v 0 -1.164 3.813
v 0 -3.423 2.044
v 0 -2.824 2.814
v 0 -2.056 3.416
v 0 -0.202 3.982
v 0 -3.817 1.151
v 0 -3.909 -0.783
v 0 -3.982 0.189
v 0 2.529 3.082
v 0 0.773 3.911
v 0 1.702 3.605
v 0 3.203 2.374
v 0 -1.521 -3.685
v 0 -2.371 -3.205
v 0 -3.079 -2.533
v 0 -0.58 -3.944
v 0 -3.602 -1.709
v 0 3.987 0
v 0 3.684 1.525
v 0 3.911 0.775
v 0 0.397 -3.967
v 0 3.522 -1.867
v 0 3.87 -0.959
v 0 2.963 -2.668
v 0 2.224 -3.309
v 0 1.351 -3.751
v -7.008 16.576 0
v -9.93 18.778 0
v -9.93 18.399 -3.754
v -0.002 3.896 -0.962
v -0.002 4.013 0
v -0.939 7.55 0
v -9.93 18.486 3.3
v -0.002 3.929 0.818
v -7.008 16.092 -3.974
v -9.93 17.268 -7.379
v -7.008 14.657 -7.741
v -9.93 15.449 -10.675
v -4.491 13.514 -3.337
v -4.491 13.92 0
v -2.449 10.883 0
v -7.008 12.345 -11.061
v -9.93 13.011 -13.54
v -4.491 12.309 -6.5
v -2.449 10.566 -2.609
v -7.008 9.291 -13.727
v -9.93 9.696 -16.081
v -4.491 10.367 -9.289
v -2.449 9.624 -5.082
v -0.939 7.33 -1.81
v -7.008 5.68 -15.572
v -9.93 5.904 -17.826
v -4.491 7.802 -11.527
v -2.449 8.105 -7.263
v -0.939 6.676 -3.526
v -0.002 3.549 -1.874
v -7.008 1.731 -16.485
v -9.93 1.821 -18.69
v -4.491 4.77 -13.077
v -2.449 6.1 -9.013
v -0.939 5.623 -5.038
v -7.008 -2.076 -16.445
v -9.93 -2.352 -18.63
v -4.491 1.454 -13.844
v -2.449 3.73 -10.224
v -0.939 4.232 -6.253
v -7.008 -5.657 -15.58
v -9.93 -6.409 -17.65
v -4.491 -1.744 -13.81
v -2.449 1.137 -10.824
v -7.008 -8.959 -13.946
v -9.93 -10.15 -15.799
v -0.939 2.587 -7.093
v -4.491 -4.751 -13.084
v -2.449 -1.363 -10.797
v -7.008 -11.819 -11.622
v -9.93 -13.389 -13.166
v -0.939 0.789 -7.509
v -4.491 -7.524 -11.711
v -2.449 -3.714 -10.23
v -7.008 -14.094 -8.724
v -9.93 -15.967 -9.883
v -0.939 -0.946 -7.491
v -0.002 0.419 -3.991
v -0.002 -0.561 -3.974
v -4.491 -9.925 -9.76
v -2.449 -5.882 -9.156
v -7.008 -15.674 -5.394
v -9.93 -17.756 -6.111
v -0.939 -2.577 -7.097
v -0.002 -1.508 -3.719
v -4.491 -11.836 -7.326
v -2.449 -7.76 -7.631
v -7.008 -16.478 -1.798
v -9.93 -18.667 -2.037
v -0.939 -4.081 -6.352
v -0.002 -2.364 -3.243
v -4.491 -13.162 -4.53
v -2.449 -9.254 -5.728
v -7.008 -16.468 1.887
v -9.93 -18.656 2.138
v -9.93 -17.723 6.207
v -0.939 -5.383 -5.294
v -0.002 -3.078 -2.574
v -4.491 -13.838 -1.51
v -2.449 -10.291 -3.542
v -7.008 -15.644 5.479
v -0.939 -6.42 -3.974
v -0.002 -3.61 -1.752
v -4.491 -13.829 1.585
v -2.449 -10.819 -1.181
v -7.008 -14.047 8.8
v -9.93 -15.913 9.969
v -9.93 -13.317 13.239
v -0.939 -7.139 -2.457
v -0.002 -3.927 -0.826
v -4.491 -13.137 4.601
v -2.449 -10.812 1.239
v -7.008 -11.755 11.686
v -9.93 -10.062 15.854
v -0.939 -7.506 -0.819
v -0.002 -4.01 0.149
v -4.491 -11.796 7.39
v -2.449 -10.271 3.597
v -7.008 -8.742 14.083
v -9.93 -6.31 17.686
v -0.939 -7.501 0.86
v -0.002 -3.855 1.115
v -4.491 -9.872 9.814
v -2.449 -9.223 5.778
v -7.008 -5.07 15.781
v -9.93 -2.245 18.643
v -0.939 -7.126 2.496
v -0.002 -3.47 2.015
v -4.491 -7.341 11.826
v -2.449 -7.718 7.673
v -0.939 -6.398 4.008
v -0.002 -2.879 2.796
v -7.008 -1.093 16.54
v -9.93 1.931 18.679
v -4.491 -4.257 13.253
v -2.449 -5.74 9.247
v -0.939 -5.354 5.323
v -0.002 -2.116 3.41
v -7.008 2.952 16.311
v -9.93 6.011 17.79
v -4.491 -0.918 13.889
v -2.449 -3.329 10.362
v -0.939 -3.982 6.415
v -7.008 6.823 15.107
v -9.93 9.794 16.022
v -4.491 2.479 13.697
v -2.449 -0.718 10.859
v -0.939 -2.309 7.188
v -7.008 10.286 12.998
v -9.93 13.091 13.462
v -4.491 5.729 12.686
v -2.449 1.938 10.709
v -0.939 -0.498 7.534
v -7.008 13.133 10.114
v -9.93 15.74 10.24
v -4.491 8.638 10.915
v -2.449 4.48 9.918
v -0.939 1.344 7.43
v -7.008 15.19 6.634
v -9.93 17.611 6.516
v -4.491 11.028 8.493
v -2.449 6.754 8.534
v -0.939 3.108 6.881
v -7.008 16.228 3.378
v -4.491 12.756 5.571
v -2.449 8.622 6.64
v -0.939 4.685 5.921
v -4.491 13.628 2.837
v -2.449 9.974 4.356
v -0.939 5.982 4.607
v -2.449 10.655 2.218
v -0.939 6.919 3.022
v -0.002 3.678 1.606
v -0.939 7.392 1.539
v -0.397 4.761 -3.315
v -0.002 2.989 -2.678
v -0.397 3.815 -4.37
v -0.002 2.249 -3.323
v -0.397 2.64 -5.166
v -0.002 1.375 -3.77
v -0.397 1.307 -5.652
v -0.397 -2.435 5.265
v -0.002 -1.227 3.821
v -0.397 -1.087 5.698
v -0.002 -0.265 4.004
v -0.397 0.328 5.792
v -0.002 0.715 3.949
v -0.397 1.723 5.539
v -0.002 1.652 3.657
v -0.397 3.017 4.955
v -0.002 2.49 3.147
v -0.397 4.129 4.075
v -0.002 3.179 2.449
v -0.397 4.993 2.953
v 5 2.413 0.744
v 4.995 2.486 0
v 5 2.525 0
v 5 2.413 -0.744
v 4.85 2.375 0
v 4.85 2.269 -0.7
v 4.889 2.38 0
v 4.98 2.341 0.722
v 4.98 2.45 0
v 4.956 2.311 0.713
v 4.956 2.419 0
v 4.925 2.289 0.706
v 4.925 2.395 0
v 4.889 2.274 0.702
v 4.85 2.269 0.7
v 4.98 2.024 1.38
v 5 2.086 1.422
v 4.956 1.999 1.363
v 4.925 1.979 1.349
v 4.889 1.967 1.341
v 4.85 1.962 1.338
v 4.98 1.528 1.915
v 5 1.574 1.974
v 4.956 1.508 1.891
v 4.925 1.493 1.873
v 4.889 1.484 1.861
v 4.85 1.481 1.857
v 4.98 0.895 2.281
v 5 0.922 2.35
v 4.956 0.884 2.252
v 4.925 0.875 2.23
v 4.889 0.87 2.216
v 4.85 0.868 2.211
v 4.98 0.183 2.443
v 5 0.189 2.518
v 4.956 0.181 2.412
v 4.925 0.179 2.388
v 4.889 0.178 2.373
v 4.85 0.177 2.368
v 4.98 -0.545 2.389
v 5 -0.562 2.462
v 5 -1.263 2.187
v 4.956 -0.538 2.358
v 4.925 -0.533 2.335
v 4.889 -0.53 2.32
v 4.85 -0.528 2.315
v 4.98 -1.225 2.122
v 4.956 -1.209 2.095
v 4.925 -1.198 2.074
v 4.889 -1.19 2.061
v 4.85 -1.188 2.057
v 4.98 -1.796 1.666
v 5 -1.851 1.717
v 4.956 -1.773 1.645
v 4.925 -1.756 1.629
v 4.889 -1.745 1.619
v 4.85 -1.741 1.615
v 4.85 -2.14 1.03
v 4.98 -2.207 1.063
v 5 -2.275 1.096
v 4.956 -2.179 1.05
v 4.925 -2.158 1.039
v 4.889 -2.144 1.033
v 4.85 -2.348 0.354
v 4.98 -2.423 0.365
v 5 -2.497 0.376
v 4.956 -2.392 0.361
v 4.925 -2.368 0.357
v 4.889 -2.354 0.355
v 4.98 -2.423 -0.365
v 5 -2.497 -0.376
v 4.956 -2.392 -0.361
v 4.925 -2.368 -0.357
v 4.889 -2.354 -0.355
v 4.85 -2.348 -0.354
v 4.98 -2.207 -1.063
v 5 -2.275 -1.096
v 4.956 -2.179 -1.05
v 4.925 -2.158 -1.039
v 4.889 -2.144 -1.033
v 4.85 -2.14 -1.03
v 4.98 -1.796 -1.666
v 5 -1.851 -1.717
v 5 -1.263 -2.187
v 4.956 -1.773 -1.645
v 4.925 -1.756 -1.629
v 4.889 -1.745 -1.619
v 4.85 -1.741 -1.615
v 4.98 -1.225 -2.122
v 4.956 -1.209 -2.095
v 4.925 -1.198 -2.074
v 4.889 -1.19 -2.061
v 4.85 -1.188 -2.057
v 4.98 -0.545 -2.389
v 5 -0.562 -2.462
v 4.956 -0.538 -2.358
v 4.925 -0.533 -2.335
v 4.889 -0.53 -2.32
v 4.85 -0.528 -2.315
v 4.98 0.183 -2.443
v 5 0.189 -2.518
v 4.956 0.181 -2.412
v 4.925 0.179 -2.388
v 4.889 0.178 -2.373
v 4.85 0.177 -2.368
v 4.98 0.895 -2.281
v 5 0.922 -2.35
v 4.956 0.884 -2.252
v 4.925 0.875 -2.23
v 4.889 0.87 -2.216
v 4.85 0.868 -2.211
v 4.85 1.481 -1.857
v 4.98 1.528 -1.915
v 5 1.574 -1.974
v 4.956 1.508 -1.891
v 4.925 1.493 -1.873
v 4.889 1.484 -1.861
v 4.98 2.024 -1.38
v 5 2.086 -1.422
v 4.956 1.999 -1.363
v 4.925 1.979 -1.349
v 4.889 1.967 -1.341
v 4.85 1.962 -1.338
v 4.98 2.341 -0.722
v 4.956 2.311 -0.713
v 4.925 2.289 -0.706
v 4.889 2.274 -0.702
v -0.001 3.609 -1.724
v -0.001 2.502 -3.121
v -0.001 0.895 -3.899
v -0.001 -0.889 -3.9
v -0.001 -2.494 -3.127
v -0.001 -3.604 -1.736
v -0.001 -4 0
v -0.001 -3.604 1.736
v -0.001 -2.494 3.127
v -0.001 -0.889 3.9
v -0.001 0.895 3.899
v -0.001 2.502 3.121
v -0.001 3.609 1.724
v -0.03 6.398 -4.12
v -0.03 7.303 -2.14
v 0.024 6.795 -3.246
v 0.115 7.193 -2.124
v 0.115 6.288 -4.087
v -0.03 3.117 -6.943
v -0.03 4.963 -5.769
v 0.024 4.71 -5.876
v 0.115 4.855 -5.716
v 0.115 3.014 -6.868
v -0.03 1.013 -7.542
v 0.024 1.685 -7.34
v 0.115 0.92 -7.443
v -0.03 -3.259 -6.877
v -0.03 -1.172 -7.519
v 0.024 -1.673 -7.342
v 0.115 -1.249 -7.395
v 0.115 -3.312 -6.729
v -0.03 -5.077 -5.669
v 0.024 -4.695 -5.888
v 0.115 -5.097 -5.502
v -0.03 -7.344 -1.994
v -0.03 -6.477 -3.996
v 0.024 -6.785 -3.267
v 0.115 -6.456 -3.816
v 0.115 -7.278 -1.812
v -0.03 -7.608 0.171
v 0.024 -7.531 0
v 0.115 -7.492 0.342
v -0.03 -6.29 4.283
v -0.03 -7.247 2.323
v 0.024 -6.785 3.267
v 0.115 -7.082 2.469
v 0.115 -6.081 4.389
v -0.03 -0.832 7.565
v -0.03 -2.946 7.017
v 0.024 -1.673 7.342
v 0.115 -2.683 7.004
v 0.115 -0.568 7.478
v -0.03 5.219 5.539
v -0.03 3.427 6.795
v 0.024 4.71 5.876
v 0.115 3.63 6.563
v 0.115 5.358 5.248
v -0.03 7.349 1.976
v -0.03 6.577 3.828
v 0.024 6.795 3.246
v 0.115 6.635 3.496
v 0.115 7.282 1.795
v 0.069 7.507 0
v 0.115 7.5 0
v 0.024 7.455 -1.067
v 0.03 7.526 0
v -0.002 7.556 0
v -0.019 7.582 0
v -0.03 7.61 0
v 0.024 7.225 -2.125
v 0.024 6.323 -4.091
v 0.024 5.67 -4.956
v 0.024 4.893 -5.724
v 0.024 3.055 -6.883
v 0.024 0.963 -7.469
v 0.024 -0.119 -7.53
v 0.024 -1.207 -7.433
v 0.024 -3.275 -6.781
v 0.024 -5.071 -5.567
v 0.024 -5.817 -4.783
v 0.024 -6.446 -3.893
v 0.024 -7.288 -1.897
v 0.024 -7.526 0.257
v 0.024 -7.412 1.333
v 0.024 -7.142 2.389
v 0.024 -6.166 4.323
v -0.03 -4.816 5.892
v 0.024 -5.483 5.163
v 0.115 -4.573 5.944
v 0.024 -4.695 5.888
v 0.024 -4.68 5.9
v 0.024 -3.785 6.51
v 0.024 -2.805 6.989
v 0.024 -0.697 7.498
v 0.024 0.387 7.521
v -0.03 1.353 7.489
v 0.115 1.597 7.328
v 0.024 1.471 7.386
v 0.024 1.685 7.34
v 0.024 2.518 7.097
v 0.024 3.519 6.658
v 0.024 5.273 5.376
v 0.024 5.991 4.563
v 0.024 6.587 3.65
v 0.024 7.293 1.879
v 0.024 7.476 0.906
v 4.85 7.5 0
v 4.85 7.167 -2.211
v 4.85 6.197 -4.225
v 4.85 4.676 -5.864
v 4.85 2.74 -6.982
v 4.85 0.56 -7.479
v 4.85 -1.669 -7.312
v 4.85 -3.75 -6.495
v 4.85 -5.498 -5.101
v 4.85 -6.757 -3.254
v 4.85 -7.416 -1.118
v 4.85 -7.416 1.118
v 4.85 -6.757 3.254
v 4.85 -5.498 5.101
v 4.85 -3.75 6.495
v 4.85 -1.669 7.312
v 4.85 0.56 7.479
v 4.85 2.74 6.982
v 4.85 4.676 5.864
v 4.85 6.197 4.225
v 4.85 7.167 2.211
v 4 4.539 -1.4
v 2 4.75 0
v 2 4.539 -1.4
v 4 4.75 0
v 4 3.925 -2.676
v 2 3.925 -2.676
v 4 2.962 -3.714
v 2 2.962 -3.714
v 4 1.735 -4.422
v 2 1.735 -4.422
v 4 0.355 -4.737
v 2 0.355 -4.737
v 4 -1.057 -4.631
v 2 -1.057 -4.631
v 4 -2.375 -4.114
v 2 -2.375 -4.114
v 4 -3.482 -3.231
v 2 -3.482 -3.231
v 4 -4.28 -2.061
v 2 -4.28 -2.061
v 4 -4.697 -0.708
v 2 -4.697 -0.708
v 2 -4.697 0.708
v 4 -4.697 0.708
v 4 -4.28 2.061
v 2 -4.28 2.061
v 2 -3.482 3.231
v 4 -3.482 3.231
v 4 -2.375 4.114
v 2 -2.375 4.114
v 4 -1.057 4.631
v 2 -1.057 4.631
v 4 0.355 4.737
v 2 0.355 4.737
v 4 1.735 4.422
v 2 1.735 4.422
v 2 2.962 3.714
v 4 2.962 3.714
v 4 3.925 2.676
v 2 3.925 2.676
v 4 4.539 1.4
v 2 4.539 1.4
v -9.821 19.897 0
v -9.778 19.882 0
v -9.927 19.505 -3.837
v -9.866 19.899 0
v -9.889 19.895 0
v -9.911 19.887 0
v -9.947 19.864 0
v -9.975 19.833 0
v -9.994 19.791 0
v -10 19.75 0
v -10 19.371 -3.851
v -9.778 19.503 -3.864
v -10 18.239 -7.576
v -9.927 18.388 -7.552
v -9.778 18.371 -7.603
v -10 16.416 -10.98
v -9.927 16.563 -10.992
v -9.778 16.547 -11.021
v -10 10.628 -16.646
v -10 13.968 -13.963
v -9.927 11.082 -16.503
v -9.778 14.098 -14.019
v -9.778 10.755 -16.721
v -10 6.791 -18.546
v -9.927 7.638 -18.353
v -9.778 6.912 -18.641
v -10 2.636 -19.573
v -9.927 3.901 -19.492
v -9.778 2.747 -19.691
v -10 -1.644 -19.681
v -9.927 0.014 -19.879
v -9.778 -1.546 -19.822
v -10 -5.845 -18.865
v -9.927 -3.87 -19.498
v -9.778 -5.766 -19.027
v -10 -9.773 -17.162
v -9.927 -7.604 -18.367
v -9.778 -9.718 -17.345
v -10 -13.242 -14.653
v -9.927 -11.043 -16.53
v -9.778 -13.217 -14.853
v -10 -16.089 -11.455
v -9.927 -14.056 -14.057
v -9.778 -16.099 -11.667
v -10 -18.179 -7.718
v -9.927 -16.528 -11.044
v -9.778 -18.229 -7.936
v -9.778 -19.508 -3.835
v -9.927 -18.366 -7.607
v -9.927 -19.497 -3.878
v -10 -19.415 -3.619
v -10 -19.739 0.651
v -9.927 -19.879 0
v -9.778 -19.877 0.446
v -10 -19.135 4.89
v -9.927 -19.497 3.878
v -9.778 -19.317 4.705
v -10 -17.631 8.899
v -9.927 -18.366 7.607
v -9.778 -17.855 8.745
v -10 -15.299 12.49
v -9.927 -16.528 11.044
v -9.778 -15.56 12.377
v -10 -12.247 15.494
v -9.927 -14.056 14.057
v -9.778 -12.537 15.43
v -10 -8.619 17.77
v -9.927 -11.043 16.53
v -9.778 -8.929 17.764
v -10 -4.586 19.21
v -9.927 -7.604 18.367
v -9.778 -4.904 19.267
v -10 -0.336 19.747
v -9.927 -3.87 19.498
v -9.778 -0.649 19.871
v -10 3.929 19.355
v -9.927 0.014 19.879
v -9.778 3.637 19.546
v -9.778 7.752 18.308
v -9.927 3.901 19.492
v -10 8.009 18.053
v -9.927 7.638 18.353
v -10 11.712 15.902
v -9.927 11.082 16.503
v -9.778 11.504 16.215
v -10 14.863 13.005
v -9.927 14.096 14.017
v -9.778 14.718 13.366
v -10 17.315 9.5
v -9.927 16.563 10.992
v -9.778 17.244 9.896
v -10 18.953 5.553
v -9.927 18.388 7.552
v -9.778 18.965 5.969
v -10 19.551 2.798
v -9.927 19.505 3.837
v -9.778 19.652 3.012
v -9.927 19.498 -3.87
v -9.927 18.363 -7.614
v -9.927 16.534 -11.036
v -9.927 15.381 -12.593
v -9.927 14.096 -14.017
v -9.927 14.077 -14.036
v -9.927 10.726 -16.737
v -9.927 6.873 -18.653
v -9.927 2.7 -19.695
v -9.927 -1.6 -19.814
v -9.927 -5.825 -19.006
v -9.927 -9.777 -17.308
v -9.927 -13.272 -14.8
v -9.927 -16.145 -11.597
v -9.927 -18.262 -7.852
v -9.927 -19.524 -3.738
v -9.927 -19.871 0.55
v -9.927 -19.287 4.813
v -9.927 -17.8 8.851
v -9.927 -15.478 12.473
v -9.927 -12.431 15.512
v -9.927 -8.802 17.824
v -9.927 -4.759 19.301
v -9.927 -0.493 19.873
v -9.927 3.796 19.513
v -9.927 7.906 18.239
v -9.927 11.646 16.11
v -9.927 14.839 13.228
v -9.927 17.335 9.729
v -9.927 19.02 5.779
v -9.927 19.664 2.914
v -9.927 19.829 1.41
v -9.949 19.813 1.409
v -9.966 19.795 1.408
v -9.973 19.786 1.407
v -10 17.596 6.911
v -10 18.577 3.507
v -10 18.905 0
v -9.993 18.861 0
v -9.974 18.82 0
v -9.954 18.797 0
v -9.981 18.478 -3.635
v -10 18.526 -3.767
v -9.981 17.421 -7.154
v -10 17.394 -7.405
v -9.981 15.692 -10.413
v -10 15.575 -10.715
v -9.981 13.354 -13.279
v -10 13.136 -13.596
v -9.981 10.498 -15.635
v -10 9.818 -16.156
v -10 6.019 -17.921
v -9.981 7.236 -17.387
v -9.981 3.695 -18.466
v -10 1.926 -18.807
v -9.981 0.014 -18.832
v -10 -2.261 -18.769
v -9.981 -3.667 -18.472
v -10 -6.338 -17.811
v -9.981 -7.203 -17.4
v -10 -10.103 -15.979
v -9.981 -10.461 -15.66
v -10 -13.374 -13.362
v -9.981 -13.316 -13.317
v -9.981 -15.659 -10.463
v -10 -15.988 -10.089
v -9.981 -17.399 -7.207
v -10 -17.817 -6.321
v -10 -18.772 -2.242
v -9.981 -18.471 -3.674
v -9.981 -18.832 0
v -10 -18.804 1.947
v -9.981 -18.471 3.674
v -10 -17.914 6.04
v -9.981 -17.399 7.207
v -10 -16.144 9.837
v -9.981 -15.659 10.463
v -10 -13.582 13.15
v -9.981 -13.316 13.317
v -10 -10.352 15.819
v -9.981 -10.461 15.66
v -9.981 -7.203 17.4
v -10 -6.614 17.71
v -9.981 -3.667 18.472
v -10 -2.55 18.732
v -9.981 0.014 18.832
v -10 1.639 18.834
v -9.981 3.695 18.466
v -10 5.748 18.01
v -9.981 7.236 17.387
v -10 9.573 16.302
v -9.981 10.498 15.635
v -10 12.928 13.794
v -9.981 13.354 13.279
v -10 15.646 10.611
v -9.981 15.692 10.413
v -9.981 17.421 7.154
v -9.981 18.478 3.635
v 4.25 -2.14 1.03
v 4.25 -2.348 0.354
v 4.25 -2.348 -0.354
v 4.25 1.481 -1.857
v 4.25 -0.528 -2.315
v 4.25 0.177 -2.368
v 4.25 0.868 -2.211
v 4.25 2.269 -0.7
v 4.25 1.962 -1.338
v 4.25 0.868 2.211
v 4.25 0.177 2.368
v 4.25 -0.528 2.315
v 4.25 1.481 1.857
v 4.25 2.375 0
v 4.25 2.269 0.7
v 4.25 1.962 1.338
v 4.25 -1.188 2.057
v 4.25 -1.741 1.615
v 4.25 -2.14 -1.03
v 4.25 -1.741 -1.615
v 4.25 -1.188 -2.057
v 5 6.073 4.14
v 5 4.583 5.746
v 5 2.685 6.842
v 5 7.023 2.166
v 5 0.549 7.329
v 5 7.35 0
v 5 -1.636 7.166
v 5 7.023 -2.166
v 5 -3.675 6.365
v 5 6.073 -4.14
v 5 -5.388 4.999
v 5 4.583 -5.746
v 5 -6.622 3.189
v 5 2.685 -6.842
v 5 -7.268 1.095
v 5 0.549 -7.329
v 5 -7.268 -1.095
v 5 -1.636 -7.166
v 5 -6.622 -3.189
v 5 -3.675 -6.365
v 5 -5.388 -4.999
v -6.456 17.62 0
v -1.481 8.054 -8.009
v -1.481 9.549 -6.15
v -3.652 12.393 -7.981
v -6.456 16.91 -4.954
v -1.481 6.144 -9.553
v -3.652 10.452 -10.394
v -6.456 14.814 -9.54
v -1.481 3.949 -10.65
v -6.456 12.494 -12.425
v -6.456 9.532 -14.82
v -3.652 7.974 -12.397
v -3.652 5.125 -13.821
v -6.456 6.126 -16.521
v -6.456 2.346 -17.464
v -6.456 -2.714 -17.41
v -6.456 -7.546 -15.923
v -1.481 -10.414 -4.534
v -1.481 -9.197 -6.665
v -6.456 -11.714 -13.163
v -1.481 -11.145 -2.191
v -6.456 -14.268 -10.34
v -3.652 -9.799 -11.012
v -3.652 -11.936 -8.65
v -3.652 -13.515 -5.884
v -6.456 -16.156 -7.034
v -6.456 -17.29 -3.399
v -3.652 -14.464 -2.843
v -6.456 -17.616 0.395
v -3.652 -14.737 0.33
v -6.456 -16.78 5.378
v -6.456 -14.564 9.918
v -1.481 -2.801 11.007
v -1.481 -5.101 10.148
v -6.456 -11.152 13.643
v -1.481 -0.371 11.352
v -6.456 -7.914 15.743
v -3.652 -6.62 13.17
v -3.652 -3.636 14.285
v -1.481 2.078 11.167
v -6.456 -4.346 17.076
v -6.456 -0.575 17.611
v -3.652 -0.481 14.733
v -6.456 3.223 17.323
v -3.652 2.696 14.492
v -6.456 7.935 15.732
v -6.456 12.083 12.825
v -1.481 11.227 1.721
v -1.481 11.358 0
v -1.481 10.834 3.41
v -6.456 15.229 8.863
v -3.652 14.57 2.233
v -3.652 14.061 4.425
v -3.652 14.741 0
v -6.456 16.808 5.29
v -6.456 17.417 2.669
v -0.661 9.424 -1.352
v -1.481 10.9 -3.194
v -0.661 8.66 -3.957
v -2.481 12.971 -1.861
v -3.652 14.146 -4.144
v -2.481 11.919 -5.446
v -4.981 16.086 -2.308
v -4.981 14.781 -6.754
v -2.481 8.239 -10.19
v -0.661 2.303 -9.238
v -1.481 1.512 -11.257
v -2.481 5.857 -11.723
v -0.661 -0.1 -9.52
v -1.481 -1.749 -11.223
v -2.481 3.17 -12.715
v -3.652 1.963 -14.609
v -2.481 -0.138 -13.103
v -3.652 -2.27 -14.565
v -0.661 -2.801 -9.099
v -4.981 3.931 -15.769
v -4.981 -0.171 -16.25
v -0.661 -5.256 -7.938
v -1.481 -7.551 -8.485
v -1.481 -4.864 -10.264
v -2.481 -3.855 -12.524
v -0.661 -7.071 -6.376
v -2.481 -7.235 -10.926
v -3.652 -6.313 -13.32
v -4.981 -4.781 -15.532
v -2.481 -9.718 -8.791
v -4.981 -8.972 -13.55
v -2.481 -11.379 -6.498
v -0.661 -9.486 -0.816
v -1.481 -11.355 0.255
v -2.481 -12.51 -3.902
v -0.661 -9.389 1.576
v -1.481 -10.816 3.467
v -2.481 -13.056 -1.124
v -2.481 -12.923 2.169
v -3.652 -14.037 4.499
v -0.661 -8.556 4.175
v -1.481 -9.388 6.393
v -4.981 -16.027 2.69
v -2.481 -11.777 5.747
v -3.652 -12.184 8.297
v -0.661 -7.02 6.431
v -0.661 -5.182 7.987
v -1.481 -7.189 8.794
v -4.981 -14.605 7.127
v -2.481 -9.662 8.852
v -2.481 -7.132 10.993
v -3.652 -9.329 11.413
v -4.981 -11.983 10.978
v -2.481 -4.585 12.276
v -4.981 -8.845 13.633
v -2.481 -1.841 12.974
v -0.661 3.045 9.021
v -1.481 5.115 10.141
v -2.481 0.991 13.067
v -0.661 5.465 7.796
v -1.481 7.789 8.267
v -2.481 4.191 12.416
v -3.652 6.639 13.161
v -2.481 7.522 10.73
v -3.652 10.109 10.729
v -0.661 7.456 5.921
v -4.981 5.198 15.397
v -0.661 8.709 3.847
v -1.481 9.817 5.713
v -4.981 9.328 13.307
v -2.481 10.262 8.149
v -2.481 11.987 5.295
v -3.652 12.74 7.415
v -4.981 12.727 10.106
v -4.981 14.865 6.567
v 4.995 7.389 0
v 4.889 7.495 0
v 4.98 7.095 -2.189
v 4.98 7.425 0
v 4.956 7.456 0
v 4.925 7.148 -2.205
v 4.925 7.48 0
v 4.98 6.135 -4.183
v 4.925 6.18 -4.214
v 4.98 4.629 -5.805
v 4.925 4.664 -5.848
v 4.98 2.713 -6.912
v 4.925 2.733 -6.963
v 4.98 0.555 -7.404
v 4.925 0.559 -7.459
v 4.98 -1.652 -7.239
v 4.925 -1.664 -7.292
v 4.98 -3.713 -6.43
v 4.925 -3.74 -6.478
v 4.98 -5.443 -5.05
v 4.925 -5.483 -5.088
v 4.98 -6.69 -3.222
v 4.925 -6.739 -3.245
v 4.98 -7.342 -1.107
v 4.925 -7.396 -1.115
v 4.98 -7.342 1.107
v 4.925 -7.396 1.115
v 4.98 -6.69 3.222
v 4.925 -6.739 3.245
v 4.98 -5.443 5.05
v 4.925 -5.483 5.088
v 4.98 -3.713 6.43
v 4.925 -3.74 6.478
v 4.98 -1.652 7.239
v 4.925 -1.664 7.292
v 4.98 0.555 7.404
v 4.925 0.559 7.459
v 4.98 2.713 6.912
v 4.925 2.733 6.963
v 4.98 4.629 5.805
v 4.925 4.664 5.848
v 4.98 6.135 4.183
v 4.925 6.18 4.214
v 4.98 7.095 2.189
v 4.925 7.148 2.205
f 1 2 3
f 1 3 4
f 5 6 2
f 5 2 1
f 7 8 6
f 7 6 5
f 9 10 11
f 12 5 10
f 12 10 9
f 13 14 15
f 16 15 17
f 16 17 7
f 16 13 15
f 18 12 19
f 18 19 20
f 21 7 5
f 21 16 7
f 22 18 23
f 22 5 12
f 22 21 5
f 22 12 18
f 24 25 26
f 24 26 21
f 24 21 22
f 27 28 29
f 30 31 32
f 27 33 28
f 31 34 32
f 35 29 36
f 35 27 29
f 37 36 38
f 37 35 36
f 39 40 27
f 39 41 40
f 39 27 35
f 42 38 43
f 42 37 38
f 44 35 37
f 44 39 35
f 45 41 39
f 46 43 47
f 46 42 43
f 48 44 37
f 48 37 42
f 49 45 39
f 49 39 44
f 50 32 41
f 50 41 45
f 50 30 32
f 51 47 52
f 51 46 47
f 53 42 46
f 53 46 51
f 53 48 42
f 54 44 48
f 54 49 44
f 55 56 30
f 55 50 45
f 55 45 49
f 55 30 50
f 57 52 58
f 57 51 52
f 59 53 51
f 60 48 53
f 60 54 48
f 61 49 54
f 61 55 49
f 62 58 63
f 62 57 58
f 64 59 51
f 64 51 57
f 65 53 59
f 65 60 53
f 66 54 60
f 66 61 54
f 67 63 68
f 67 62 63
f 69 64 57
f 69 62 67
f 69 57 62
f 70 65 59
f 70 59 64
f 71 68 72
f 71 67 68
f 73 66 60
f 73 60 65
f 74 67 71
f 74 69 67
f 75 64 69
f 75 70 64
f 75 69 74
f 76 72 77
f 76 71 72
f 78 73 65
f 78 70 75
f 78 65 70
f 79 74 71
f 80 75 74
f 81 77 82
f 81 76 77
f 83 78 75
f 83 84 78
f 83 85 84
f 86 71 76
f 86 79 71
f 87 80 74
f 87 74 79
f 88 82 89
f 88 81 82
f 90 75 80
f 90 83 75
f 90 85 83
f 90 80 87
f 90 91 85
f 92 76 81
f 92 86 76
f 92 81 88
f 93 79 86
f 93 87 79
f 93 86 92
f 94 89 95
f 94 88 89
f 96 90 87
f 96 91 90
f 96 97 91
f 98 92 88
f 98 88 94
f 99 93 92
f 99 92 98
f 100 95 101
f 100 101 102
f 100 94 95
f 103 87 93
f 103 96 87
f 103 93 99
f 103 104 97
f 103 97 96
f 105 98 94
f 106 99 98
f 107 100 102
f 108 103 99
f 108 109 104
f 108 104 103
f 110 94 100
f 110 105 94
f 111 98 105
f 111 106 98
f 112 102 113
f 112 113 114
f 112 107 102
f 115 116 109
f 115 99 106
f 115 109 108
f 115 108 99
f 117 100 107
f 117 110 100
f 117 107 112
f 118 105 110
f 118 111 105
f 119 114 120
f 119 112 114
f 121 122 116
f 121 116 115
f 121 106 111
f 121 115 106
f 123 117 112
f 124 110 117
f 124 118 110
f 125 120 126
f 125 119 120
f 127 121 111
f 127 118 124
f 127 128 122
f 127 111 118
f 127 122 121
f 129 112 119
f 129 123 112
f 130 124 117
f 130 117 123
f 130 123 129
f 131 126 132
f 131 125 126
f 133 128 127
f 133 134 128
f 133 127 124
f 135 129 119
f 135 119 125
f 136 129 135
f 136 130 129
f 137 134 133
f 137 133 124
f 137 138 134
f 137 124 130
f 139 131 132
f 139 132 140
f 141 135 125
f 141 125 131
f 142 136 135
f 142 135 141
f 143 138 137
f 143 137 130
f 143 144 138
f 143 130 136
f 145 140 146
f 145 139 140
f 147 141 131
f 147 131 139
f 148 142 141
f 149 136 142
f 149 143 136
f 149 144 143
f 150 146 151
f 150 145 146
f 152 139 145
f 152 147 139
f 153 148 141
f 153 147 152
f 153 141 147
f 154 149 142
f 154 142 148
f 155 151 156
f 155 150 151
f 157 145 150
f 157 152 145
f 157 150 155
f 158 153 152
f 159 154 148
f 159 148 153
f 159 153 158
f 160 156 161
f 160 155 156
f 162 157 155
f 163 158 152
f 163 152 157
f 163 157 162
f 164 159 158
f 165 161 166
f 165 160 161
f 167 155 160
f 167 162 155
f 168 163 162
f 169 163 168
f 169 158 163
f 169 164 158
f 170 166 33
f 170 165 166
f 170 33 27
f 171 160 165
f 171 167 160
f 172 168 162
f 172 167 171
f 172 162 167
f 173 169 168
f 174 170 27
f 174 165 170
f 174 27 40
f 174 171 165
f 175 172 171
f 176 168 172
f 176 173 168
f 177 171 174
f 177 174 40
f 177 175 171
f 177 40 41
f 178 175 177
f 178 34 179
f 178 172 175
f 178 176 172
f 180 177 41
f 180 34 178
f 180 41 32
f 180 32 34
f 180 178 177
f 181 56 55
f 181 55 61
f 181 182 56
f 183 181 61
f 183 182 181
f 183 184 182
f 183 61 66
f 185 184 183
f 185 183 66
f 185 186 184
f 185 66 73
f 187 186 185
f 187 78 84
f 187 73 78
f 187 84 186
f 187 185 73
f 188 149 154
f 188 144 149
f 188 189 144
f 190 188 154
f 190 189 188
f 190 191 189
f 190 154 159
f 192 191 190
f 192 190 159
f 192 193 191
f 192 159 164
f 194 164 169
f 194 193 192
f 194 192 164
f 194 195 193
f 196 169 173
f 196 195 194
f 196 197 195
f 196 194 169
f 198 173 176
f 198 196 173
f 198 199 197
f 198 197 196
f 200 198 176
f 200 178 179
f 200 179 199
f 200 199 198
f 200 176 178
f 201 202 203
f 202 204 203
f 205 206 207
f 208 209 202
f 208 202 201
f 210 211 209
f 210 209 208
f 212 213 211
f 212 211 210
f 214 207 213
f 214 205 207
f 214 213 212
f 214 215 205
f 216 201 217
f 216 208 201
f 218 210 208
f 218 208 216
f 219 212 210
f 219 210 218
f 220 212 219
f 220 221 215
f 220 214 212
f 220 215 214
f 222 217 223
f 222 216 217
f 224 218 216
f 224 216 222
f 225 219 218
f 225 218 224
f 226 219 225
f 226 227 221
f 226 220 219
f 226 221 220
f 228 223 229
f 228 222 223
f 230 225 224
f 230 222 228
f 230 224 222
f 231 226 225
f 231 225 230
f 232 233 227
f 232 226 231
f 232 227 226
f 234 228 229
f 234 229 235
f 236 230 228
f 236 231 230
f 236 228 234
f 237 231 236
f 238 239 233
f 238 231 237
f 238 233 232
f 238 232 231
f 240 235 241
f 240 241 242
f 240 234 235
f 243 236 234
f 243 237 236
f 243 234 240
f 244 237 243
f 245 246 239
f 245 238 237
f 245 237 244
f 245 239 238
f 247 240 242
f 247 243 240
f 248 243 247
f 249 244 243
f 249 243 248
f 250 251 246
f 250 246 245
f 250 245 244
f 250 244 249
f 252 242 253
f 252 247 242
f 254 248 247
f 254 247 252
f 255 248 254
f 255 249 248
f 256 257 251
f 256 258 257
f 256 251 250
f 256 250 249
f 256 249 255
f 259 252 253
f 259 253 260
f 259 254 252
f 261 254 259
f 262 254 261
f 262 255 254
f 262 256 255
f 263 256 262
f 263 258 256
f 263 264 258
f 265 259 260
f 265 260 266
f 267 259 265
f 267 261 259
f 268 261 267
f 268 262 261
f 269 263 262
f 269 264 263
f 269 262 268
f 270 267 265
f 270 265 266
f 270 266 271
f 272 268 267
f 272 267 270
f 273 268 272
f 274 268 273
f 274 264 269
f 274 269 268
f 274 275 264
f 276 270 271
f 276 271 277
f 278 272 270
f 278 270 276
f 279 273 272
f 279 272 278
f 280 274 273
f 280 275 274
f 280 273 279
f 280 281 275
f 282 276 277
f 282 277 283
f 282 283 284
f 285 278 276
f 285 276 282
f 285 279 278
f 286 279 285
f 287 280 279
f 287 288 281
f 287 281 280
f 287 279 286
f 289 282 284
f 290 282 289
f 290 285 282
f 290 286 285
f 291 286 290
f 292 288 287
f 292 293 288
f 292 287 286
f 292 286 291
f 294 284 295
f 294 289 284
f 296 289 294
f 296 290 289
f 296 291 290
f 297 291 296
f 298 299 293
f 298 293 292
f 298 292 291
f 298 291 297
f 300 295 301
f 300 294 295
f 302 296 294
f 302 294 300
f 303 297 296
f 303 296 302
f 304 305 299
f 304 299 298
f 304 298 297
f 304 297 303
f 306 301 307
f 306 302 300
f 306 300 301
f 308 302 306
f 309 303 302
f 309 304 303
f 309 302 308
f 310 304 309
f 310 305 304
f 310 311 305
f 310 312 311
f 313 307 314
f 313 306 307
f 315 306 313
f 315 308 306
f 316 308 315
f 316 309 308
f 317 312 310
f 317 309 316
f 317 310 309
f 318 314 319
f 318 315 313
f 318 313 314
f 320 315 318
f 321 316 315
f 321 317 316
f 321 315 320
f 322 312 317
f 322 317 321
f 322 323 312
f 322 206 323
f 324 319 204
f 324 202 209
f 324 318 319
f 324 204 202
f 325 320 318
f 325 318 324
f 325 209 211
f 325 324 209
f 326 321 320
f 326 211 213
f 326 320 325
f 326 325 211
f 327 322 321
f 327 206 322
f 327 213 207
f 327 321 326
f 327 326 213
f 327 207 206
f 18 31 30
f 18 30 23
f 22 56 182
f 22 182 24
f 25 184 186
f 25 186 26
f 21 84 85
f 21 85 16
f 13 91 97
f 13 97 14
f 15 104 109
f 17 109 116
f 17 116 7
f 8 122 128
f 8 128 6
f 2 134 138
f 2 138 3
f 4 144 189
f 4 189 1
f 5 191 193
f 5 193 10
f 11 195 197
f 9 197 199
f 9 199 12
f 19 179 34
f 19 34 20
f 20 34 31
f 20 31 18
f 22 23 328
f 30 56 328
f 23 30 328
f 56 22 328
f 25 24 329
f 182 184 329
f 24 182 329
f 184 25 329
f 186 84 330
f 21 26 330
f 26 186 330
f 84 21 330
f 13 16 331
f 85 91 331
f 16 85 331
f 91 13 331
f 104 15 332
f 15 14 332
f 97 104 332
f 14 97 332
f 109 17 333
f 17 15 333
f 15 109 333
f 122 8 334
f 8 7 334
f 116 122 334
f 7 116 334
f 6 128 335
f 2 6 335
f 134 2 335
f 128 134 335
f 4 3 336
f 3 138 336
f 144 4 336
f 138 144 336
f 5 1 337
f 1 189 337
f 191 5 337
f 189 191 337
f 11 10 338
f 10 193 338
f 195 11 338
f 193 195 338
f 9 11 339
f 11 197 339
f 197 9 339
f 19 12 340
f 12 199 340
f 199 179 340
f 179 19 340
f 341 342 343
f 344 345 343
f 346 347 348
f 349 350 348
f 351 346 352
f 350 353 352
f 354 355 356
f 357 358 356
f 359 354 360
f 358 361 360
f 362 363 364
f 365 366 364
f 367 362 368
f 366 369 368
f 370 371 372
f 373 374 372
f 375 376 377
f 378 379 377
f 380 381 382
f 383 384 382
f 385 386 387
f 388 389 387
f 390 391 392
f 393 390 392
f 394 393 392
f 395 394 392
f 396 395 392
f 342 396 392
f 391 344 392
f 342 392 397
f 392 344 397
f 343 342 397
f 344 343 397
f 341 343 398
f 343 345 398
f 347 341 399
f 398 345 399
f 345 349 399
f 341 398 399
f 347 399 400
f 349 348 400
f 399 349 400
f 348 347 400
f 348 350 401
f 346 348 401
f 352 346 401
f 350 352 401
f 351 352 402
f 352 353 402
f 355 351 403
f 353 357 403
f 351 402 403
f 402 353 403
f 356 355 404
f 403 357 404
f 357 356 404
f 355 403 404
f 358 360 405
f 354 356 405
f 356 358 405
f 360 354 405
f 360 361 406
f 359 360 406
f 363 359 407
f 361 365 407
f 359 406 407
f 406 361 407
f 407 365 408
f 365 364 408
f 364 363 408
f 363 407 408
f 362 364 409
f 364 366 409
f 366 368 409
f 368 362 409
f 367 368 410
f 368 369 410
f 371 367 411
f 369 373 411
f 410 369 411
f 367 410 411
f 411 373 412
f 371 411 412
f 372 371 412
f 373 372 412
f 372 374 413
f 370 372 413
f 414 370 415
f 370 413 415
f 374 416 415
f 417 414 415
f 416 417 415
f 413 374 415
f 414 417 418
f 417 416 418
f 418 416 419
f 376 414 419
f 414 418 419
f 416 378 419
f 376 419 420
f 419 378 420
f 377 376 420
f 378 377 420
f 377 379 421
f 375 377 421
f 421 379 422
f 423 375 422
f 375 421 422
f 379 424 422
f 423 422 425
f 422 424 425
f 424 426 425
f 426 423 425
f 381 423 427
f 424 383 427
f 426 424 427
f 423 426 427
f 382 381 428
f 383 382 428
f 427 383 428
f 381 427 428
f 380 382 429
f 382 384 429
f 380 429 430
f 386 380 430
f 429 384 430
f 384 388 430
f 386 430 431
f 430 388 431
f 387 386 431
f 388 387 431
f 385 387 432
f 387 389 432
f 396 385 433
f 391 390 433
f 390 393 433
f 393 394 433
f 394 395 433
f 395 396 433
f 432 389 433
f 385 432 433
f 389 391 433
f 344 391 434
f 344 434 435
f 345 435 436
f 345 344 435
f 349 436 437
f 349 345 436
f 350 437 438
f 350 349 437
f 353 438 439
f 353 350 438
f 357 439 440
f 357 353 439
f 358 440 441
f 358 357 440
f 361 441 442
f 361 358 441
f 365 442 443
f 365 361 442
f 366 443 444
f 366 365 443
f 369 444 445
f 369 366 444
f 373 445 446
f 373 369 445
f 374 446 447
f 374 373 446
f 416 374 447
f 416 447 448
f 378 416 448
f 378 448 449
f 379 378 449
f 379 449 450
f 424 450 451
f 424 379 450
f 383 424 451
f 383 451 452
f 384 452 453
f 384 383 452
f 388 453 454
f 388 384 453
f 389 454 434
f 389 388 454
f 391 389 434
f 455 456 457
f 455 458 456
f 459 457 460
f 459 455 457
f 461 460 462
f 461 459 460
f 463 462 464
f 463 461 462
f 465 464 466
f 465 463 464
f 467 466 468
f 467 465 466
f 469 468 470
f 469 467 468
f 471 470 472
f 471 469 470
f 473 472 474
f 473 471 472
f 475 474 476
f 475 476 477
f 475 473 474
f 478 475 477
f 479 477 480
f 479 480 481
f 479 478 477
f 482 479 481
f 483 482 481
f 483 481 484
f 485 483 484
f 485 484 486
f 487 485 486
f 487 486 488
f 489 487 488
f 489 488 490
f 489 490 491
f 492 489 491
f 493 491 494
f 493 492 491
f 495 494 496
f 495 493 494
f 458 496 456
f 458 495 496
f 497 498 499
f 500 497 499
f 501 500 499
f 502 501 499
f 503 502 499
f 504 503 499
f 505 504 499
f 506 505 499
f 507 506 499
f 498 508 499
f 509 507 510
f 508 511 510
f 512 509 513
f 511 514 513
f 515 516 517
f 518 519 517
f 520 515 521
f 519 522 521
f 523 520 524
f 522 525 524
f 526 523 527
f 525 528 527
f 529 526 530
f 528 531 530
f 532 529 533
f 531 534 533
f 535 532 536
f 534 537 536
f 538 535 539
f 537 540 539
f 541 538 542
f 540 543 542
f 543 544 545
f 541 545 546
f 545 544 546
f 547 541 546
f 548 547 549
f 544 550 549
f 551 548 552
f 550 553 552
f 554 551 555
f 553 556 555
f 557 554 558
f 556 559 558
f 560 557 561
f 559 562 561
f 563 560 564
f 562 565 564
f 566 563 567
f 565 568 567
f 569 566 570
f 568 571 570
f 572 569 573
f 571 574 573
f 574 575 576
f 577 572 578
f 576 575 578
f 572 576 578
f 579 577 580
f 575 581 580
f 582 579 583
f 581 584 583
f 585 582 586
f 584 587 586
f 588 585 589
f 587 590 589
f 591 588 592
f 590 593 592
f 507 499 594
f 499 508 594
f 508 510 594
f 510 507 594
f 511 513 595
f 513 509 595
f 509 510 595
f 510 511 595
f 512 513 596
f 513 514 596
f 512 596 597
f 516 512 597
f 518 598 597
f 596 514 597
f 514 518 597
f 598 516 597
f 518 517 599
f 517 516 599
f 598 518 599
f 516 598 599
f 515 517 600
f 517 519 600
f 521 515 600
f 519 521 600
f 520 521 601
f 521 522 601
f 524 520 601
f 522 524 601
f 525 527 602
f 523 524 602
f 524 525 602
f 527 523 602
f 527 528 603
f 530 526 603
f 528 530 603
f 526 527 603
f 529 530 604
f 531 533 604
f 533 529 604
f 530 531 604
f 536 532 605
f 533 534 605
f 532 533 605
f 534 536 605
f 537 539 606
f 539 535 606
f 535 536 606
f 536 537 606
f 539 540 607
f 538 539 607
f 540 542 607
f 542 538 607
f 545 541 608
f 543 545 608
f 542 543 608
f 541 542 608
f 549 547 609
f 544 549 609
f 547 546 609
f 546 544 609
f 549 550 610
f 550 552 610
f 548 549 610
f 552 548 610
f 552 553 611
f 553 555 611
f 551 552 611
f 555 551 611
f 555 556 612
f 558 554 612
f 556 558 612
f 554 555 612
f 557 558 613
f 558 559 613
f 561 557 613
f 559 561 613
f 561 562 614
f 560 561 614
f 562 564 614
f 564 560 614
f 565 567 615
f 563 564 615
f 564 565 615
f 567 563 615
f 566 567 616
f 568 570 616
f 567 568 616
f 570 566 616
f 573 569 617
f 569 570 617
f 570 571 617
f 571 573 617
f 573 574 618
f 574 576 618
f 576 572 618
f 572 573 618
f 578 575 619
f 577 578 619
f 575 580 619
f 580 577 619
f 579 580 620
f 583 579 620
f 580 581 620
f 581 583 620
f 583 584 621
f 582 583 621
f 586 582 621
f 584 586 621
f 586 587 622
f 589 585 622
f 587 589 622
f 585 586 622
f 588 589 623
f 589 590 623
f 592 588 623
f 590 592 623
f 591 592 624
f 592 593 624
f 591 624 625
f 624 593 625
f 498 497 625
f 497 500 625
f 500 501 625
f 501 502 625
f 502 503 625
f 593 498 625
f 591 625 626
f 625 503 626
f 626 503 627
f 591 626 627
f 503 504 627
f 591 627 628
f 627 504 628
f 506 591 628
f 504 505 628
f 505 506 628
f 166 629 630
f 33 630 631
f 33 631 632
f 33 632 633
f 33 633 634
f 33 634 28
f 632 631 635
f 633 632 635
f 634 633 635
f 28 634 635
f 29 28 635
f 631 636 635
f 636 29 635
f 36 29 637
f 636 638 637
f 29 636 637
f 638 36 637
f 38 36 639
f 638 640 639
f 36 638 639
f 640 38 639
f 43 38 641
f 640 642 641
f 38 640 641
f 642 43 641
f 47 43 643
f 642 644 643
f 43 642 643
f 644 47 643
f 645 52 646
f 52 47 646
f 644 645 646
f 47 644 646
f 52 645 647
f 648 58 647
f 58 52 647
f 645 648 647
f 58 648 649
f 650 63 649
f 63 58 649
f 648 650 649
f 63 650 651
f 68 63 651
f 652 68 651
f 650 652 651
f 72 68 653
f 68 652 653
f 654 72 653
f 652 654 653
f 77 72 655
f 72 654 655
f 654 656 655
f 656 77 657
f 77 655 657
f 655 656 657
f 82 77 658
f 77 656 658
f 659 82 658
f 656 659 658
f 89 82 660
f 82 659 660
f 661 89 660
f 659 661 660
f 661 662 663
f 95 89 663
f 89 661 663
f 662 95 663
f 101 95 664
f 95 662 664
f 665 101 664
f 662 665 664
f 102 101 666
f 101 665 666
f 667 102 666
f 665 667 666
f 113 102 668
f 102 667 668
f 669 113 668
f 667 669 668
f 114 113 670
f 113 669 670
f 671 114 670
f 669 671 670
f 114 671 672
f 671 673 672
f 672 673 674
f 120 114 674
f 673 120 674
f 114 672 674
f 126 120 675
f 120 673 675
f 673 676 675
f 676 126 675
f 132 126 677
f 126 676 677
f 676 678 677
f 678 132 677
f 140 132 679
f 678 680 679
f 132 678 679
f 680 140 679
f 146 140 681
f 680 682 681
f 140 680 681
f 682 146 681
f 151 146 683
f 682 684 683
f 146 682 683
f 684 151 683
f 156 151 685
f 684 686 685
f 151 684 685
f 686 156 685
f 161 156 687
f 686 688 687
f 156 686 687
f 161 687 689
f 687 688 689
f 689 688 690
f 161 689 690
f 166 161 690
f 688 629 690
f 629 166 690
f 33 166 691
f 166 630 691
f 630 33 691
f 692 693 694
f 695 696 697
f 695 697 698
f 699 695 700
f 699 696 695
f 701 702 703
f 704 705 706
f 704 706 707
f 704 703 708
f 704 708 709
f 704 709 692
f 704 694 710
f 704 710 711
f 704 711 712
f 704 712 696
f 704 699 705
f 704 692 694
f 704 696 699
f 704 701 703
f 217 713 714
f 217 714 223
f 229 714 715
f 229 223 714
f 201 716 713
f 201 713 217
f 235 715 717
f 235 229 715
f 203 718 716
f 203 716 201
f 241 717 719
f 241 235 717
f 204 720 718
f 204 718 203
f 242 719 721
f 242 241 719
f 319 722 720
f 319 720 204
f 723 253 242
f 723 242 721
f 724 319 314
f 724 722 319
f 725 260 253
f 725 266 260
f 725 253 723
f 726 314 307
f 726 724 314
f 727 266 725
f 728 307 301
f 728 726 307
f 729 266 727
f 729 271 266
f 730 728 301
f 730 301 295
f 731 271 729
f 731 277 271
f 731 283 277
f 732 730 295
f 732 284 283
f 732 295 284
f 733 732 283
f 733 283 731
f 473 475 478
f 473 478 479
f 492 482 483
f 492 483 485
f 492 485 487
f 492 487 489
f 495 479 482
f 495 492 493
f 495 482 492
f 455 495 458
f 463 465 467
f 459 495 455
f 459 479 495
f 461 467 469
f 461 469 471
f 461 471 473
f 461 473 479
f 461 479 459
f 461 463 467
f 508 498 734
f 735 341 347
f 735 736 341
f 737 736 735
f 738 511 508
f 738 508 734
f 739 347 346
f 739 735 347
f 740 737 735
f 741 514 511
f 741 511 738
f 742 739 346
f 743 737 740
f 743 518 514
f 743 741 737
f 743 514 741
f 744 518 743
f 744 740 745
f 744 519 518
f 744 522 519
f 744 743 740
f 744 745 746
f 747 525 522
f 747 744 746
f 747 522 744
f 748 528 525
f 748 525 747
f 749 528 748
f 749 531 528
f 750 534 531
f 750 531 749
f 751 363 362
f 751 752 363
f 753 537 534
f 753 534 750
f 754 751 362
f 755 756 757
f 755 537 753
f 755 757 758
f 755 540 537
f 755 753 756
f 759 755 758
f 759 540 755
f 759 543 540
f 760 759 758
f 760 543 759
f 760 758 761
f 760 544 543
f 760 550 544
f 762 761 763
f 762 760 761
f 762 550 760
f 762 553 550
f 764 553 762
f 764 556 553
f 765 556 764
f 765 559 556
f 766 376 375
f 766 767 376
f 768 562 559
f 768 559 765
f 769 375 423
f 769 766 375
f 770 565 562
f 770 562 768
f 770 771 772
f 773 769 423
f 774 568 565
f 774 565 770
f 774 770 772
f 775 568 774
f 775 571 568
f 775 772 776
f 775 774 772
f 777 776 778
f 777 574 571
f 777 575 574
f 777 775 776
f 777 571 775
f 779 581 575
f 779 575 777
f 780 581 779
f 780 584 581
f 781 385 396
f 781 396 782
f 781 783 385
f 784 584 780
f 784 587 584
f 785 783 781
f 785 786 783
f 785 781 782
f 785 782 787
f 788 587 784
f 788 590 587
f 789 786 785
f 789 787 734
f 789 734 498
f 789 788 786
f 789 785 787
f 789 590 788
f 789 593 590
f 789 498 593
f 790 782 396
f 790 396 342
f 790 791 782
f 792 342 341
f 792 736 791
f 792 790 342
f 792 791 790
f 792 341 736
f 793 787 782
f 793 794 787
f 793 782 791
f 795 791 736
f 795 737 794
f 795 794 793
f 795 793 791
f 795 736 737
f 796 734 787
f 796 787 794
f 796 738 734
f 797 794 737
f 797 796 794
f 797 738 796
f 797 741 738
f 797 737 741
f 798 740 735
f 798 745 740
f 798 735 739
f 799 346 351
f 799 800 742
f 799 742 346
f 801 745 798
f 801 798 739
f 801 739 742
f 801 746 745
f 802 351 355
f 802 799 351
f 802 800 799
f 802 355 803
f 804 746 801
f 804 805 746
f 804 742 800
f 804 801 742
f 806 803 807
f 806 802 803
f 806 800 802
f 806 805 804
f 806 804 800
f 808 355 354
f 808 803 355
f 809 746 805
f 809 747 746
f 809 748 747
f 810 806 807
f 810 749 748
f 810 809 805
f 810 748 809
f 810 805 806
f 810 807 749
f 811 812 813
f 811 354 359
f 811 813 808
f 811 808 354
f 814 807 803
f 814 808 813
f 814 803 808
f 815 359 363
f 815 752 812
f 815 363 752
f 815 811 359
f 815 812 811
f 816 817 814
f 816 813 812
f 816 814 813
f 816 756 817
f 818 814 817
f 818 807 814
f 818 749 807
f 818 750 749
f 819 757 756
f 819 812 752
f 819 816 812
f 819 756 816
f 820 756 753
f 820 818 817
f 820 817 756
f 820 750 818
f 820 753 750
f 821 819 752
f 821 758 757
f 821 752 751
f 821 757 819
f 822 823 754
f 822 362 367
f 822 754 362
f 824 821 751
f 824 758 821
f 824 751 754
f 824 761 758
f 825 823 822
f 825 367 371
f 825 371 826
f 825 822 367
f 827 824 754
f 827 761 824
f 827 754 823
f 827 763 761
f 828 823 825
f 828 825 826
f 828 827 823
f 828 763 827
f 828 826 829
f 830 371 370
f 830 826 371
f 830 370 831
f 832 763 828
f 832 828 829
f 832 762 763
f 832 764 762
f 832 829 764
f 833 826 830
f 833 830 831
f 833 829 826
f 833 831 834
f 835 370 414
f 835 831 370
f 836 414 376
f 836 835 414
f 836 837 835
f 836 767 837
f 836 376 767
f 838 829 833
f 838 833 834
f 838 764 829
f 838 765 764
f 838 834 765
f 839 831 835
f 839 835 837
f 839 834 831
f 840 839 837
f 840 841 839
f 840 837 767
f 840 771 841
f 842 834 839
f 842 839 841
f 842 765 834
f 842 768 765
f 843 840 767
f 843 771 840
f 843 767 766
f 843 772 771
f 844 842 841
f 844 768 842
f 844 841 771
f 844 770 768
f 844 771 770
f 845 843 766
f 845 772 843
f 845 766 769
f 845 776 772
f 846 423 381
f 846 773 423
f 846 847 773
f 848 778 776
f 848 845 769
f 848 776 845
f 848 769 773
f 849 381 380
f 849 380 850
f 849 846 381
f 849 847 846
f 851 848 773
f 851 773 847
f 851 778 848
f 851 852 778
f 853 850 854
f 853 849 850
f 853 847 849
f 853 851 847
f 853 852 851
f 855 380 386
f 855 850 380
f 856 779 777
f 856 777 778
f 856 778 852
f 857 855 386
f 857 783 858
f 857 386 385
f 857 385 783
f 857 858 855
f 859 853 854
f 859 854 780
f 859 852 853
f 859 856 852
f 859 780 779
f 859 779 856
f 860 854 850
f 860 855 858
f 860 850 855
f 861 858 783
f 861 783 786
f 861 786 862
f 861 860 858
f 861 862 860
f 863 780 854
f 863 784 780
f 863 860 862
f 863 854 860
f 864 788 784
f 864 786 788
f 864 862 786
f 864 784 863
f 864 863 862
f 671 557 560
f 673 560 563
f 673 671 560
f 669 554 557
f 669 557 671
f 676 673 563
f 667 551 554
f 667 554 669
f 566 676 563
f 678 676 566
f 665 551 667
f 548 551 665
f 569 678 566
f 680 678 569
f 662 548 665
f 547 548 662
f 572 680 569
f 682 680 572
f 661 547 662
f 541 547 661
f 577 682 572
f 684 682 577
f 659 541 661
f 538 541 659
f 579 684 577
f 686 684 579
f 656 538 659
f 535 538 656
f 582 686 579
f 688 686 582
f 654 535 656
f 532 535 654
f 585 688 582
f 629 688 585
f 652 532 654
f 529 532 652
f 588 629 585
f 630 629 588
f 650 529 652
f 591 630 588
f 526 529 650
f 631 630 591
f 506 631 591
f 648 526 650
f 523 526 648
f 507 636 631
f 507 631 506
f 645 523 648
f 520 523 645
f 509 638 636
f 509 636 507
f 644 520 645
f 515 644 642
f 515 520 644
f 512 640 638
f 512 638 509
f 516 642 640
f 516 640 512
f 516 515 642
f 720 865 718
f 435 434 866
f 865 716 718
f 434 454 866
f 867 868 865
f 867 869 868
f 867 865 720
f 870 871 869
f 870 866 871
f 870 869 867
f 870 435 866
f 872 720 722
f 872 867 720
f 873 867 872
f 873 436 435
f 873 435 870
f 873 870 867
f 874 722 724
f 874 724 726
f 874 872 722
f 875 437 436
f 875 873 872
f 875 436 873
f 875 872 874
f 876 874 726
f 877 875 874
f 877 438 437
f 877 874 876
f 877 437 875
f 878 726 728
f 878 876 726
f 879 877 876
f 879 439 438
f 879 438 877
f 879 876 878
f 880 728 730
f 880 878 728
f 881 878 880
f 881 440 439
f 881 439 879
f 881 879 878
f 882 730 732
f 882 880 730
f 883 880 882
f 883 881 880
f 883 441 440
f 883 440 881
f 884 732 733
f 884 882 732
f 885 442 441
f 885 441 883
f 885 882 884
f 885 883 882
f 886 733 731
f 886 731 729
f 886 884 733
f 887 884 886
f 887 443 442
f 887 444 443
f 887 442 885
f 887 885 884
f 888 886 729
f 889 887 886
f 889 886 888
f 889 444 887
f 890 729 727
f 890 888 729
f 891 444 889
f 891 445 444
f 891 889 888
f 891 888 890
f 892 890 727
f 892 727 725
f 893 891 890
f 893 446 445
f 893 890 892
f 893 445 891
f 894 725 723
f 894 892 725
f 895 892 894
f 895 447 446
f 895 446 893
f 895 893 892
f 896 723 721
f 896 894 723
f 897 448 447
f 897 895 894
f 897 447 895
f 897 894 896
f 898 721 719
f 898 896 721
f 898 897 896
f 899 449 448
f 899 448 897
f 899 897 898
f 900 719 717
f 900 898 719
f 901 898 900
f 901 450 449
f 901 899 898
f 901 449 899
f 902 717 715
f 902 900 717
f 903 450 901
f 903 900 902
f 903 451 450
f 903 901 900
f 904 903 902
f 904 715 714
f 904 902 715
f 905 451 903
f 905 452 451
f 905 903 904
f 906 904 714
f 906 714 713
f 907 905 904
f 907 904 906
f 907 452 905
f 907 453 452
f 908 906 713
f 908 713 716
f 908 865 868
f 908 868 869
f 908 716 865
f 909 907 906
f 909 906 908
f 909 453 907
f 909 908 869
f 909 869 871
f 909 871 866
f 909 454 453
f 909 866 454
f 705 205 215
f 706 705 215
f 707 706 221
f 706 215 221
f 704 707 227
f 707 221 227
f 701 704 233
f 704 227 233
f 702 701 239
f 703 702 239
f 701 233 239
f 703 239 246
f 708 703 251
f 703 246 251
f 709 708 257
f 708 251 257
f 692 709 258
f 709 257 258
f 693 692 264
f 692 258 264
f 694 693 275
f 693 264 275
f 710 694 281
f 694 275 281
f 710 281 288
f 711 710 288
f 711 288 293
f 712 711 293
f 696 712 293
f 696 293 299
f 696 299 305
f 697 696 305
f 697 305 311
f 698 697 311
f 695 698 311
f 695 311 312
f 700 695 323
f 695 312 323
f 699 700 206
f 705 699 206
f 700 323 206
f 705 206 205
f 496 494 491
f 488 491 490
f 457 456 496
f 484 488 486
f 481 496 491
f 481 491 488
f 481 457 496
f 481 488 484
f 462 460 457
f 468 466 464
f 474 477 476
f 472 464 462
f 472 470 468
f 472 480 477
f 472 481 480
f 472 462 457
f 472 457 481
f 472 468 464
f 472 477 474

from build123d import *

# Parameters (mm, degrees)
SKETCH2_R          = 2.375
CUT_EXTRUDE2_DEPTH = 0.75
FILLET1_R          = 0.15
FILLET2_R          = 0.15


with BuildPart() as part:
    # Sketch1 → Revolve3 (revolve)
    with BuildSketch(Plane.XY):
        with BuildLine():
            ThreePointArc((-10, 18.822019344), (-3.426328164, 12.472721845), (0, 4))
            Line((0, 4), (0, 7.5))
            ThreePointArc((0, 7.5), (-3.694854211, 14.794116631), (-10, 20))
            Line((-10, 20), (-10, 18.822019344))
        make_face()
        Polygon((0, 4), (0, 0), (2, 0), (2, 4.75), (4, 4.75), (4, 0), (5, 0), (5, 7.5), (0, 7.5), align=None)
    revolve(axis=Axis((0, 0, 0), (-1, 0, 0)))

    # Sketch2 → Cut-Extrude2 (cut)
    with BuildSketch(Plane(origin=(5, 0, 0), x_dir=(0, 0, -1), z_dir=(1, 0, 0))):
        with Locations(Location((0, 0, 0), (0, 0, 90))):
            Circle(SKETCH2_R)
    extrude(amount=-CUT_EXTRUDE2_DEPTH, mode=Mode.SUBTRACT)

    # Fillet1
    fillet1_edges = [part.edges().sort_by_distance(p)[0] for p in [
        (0, -7.5, 0),
        (5, -7.5, 0),
        (0, -4, 0),
        (-10, -18.822019344, 0),
    ]]
    fillet(fillet1_edges, radius=FILLET1_R)

    # Fillet2
    fillet2_edges = [part.edges().sort_by_distance(p)[0] for p in [
        (-10, -20, 0),
        (5, -2.375, 0),
    ]]
    fillet(fillet2_edges, radius=FILLET2_R)


solid = part.part
